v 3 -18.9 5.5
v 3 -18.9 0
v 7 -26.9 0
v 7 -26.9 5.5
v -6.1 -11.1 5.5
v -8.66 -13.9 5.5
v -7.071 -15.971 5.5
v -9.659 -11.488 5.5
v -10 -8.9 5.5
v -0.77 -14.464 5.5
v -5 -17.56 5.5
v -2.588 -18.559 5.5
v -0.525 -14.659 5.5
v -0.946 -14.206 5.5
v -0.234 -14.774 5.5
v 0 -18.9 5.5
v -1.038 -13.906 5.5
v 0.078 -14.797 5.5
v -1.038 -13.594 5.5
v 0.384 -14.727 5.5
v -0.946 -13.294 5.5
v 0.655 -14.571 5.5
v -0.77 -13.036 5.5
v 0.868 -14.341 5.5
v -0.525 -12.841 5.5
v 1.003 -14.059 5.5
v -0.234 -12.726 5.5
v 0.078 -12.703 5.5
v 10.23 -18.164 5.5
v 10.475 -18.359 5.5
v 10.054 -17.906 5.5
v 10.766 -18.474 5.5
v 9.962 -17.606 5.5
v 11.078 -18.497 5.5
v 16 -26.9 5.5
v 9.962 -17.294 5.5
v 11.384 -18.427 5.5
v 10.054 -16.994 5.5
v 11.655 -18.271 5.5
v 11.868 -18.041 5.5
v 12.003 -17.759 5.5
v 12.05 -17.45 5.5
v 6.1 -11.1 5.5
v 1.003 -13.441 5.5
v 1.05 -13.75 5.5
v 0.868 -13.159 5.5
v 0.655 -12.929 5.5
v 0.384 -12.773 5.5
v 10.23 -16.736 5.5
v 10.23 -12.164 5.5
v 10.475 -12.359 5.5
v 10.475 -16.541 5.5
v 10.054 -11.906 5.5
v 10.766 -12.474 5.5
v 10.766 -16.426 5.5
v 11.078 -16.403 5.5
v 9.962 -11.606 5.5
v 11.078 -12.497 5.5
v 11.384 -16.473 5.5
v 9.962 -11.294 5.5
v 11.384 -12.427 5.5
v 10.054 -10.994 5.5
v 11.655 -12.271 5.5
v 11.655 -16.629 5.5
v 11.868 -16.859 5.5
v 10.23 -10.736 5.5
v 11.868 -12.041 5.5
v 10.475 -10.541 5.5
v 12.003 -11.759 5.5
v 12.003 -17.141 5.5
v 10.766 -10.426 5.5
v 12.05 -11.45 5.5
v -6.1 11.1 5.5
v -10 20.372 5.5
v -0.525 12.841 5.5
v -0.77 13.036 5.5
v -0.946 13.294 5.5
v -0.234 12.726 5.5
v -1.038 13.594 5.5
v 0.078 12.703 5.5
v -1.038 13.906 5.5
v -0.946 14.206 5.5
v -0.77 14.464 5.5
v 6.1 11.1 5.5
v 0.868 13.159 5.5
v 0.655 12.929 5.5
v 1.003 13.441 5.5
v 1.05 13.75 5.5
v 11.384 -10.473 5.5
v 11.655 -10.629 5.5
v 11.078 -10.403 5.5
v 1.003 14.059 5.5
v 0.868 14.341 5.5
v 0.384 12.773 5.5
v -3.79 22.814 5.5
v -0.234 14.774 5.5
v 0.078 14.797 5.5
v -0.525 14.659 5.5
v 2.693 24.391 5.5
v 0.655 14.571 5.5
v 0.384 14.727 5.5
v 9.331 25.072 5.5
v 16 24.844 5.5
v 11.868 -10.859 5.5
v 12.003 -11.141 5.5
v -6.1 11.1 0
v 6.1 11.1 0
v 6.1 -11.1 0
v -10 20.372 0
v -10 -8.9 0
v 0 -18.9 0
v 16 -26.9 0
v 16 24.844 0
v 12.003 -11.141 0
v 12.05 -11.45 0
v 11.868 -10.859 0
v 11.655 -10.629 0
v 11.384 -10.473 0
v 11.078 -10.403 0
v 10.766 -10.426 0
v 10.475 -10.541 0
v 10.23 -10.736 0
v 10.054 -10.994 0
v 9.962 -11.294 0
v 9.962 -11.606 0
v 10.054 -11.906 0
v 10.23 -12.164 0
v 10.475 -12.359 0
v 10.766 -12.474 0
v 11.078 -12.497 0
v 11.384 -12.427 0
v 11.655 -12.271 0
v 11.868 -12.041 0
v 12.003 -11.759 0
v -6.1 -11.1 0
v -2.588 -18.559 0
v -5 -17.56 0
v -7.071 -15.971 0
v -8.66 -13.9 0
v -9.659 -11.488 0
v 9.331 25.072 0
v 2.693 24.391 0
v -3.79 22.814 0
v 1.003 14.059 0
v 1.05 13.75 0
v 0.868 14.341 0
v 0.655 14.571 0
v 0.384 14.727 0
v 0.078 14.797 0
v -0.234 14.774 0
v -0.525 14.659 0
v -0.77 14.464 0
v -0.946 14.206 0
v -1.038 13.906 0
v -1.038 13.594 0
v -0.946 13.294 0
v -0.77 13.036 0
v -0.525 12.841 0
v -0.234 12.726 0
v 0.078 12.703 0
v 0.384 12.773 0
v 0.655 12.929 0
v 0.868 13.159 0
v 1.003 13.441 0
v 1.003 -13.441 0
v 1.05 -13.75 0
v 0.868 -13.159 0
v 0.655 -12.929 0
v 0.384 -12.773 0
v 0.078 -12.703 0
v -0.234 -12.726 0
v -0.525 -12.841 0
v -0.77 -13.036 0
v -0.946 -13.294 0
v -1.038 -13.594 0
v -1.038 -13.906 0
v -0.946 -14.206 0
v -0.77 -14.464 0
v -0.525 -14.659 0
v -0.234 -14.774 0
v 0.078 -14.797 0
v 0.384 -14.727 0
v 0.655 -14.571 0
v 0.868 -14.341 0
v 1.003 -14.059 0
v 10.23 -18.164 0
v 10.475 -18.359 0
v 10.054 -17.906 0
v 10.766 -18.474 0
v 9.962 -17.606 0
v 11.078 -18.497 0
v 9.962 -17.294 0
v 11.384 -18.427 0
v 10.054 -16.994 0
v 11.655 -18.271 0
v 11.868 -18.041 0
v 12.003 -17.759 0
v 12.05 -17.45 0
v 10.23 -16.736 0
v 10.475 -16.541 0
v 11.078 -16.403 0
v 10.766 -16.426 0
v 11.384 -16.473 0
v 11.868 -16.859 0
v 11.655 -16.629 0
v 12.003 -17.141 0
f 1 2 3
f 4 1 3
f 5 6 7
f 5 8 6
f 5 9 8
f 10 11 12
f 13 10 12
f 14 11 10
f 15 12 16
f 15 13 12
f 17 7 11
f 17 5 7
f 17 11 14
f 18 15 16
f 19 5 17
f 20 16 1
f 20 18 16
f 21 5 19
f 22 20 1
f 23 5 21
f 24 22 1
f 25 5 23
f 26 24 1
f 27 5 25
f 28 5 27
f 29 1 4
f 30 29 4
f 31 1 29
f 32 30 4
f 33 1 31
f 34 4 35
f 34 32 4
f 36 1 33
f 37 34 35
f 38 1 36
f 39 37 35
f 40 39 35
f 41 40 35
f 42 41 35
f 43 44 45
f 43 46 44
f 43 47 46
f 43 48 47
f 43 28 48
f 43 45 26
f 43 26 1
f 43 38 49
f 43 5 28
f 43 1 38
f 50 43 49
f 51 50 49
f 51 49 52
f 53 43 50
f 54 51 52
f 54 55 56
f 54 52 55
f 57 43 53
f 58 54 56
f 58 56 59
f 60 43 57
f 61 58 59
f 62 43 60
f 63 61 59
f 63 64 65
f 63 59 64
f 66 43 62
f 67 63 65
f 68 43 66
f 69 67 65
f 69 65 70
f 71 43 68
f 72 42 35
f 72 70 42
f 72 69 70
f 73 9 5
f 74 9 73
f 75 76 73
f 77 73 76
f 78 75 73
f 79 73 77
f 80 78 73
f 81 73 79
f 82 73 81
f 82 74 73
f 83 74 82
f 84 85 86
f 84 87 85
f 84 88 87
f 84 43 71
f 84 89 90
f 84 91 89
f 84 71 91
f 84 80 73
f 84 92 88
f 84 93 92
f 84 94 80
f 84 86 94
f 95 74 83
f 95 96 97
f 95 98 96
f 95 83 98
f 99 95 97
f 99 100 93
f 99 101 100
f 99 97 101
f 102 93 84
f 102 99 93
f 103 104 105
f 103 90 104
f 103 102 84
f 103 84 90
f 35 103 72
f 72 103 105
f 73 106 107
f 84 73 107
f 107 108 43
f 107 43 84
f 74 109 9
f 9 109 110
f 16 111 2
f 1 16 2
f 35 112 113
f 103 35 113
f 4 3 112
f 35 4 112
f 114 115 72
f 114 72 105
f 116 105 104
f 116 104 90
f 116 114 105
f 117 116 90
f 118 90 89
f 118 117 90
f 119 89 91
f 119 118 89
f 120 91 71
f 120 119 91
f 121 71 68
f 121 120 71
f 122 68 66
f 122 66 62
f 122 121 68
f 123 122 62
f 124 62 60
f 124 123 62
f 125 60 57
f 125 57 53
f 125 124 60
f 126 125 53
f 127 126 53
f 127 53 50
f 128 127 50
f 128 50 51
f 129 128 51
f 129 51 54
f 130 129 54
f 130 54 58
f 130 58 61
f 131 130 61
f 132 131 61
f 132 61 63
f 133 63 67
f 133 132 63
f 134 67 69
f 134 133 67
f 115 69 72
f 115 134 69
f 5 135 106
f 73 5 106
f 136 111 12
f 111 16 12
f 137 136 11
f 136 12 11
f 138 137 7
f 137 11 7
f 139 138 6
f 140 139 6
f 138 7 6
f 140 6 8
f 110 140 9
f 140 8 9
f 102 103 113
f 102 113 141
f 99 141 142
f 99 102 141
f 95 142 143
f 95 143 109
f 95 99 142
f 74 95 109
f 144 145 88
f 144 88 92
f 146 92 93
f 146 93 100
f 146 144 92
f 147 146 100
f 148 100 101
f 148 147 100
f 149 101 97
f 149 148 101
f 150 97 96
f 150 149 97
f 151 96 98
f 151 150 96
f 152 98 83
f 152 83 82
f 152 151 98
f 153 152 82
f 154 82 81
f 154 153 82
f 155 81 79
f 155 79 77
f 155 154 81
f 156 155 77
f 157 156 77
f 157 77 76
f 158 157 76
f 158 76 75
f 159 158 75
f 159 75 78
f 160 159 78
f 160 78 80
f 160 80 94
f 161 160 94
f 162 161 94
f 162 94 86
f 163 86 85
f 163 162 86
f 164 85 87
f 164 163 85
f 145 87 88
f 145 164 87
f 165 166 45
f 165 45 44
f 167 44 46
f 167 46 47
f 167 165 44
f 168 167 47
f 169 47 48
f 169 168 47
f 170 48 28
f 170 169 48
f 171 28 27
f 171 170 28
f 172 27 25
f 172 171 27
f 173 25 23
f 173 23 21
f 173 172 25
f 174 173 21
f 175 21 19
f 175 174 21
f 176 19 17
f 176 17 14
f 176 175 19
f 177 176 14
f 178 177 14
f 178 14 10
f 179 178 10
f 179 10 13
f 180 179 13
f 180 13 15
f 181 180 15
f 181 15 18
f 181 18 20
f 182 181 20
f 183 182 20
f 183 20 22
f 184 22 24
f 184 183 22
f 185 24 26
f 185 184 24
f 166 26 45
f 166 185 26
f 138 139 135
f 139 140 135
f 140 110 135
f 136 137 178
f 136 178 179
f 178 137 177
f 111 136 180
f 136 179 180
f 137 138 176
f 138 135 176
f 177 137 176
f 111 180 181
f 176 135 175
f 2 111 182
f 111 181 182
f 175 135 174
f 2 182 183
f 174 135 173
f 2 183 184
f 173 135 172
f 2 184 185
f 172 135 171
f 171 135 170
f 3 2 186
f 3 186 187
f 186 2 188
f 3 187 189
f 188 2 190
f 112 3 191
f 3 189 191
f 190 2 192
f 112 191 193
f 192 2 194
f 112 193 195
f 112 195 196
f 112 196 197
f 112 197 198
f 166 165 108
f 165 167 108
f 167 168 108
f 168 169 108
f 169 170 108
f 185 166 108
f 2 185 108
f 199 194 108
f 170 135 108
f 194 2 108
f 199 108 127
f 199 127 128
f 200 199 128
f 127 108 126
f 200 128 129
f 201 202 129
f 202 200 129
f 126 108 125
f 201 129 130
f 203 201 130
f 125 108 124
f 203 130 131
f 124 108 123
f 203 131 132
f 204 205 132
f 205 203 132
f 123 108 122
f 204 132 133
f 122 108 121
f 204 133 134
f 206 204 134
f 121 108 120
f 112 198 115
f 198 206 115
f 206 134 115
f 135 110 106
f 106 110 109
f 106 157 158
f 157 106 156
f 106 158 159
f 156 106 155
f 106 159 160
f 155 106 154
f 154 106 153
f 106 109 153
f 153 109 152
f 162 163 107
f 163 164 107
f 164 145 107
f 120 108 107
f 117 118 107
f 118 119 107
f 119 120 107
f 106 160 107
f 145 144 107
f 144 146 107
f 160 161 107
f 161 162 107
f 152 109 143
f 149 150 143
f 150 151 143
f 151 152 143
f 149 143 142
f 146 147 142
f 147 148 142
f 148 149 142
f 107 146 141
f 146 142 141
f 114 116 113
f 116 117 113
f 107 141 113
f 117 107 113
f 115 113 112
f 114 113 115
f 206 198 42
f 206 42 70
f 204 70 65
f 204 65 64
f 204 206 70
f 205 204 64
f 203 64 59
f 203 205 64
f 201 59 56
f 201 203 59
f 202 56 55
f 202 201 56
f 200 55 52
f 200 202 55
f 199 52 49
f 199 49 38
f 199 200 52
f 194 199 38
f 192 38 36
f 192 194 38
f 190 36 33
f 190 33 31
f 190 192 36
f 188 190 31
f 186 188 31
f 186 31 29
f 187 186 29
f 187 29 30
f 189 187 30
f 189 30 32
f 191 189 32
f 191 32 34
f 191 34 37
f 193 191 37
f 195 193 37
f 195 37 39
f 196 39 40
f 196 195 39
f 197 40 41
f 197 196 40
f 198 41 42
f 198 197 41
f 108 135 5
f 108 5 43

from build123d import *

# Parameters (mm, degrees)
SKETCH_1_R          = 1.05
SKETCH_1_W          = 12.2
SKETCH_1_H          = 22.2
EXTRUDE_1_DEPTH     = 5.5
CUT_EXTRUDE_1_DEPTH = 32.778294479
FILLET_1_R          = 10


with BuildPart() as part:
    # ｽｹｯﾁ1 → ﾎﾞｽ - 押し出し1 (new body)
    with BuildSketch(Plane.XY):
        Polygon((-10, -18.9), (3, -18.9), (7, -26.9), (16, -26.9), (16, 26.1), (-10, 26.1), align=None)
        with Locations((0, -13.75)):
            Circle(SKETCH_1_R, mode=Mode.SUBTRACT)
        with Locations((0, 13.75)):
            Circle(SKETCH_1_R, mode=Mode.SUBTRACT)
        with Locations((11, -17.45)):
            Circle(SKETCH_1_R, mode=Mode.SUBTRACT)
        with Locations((11, -11.45)):
            Circle(SKETCH_1_R, mode=Mode.SUBTRACT)
        Rectangle(SKETCH_1_W, SKETCH_1_H, mode=Mode.SUBTRACT)
    extrude(amount=EXTRUDE_1_DEPTH)

    # ｽｹｯﾁ2 → ｶｯﾄ - 押し出し1 (cut, through all)
    with BuildSketch(Plane.XY.offset(5.5)):
        with BuildLine():
            Line((-10, 20.371887242), (-10, 26.1))
            Line((-10, 26.1), (16, 26.1))
            Line((16, 26.1), (16, 24.844230428))
            ThreePointArc((16, 24.844230428), (2.693348244, 24.390781073), (-10, 20.371887242))
        make_face()
    extrude(amount=-CUT_EXTRUDE_1_DEPTH, mode=Mode.SUBTRACT)

    # ﾌｨﾚｯﾄ1
    fillet_1_edges = [part.edges().sort_by_distance(p)[0] for p in [
        (-10, -18.9, 2.75),
    ]]
    fillet(fillet_1_edges, radius=FILLET_1_R)


solid = part.part
